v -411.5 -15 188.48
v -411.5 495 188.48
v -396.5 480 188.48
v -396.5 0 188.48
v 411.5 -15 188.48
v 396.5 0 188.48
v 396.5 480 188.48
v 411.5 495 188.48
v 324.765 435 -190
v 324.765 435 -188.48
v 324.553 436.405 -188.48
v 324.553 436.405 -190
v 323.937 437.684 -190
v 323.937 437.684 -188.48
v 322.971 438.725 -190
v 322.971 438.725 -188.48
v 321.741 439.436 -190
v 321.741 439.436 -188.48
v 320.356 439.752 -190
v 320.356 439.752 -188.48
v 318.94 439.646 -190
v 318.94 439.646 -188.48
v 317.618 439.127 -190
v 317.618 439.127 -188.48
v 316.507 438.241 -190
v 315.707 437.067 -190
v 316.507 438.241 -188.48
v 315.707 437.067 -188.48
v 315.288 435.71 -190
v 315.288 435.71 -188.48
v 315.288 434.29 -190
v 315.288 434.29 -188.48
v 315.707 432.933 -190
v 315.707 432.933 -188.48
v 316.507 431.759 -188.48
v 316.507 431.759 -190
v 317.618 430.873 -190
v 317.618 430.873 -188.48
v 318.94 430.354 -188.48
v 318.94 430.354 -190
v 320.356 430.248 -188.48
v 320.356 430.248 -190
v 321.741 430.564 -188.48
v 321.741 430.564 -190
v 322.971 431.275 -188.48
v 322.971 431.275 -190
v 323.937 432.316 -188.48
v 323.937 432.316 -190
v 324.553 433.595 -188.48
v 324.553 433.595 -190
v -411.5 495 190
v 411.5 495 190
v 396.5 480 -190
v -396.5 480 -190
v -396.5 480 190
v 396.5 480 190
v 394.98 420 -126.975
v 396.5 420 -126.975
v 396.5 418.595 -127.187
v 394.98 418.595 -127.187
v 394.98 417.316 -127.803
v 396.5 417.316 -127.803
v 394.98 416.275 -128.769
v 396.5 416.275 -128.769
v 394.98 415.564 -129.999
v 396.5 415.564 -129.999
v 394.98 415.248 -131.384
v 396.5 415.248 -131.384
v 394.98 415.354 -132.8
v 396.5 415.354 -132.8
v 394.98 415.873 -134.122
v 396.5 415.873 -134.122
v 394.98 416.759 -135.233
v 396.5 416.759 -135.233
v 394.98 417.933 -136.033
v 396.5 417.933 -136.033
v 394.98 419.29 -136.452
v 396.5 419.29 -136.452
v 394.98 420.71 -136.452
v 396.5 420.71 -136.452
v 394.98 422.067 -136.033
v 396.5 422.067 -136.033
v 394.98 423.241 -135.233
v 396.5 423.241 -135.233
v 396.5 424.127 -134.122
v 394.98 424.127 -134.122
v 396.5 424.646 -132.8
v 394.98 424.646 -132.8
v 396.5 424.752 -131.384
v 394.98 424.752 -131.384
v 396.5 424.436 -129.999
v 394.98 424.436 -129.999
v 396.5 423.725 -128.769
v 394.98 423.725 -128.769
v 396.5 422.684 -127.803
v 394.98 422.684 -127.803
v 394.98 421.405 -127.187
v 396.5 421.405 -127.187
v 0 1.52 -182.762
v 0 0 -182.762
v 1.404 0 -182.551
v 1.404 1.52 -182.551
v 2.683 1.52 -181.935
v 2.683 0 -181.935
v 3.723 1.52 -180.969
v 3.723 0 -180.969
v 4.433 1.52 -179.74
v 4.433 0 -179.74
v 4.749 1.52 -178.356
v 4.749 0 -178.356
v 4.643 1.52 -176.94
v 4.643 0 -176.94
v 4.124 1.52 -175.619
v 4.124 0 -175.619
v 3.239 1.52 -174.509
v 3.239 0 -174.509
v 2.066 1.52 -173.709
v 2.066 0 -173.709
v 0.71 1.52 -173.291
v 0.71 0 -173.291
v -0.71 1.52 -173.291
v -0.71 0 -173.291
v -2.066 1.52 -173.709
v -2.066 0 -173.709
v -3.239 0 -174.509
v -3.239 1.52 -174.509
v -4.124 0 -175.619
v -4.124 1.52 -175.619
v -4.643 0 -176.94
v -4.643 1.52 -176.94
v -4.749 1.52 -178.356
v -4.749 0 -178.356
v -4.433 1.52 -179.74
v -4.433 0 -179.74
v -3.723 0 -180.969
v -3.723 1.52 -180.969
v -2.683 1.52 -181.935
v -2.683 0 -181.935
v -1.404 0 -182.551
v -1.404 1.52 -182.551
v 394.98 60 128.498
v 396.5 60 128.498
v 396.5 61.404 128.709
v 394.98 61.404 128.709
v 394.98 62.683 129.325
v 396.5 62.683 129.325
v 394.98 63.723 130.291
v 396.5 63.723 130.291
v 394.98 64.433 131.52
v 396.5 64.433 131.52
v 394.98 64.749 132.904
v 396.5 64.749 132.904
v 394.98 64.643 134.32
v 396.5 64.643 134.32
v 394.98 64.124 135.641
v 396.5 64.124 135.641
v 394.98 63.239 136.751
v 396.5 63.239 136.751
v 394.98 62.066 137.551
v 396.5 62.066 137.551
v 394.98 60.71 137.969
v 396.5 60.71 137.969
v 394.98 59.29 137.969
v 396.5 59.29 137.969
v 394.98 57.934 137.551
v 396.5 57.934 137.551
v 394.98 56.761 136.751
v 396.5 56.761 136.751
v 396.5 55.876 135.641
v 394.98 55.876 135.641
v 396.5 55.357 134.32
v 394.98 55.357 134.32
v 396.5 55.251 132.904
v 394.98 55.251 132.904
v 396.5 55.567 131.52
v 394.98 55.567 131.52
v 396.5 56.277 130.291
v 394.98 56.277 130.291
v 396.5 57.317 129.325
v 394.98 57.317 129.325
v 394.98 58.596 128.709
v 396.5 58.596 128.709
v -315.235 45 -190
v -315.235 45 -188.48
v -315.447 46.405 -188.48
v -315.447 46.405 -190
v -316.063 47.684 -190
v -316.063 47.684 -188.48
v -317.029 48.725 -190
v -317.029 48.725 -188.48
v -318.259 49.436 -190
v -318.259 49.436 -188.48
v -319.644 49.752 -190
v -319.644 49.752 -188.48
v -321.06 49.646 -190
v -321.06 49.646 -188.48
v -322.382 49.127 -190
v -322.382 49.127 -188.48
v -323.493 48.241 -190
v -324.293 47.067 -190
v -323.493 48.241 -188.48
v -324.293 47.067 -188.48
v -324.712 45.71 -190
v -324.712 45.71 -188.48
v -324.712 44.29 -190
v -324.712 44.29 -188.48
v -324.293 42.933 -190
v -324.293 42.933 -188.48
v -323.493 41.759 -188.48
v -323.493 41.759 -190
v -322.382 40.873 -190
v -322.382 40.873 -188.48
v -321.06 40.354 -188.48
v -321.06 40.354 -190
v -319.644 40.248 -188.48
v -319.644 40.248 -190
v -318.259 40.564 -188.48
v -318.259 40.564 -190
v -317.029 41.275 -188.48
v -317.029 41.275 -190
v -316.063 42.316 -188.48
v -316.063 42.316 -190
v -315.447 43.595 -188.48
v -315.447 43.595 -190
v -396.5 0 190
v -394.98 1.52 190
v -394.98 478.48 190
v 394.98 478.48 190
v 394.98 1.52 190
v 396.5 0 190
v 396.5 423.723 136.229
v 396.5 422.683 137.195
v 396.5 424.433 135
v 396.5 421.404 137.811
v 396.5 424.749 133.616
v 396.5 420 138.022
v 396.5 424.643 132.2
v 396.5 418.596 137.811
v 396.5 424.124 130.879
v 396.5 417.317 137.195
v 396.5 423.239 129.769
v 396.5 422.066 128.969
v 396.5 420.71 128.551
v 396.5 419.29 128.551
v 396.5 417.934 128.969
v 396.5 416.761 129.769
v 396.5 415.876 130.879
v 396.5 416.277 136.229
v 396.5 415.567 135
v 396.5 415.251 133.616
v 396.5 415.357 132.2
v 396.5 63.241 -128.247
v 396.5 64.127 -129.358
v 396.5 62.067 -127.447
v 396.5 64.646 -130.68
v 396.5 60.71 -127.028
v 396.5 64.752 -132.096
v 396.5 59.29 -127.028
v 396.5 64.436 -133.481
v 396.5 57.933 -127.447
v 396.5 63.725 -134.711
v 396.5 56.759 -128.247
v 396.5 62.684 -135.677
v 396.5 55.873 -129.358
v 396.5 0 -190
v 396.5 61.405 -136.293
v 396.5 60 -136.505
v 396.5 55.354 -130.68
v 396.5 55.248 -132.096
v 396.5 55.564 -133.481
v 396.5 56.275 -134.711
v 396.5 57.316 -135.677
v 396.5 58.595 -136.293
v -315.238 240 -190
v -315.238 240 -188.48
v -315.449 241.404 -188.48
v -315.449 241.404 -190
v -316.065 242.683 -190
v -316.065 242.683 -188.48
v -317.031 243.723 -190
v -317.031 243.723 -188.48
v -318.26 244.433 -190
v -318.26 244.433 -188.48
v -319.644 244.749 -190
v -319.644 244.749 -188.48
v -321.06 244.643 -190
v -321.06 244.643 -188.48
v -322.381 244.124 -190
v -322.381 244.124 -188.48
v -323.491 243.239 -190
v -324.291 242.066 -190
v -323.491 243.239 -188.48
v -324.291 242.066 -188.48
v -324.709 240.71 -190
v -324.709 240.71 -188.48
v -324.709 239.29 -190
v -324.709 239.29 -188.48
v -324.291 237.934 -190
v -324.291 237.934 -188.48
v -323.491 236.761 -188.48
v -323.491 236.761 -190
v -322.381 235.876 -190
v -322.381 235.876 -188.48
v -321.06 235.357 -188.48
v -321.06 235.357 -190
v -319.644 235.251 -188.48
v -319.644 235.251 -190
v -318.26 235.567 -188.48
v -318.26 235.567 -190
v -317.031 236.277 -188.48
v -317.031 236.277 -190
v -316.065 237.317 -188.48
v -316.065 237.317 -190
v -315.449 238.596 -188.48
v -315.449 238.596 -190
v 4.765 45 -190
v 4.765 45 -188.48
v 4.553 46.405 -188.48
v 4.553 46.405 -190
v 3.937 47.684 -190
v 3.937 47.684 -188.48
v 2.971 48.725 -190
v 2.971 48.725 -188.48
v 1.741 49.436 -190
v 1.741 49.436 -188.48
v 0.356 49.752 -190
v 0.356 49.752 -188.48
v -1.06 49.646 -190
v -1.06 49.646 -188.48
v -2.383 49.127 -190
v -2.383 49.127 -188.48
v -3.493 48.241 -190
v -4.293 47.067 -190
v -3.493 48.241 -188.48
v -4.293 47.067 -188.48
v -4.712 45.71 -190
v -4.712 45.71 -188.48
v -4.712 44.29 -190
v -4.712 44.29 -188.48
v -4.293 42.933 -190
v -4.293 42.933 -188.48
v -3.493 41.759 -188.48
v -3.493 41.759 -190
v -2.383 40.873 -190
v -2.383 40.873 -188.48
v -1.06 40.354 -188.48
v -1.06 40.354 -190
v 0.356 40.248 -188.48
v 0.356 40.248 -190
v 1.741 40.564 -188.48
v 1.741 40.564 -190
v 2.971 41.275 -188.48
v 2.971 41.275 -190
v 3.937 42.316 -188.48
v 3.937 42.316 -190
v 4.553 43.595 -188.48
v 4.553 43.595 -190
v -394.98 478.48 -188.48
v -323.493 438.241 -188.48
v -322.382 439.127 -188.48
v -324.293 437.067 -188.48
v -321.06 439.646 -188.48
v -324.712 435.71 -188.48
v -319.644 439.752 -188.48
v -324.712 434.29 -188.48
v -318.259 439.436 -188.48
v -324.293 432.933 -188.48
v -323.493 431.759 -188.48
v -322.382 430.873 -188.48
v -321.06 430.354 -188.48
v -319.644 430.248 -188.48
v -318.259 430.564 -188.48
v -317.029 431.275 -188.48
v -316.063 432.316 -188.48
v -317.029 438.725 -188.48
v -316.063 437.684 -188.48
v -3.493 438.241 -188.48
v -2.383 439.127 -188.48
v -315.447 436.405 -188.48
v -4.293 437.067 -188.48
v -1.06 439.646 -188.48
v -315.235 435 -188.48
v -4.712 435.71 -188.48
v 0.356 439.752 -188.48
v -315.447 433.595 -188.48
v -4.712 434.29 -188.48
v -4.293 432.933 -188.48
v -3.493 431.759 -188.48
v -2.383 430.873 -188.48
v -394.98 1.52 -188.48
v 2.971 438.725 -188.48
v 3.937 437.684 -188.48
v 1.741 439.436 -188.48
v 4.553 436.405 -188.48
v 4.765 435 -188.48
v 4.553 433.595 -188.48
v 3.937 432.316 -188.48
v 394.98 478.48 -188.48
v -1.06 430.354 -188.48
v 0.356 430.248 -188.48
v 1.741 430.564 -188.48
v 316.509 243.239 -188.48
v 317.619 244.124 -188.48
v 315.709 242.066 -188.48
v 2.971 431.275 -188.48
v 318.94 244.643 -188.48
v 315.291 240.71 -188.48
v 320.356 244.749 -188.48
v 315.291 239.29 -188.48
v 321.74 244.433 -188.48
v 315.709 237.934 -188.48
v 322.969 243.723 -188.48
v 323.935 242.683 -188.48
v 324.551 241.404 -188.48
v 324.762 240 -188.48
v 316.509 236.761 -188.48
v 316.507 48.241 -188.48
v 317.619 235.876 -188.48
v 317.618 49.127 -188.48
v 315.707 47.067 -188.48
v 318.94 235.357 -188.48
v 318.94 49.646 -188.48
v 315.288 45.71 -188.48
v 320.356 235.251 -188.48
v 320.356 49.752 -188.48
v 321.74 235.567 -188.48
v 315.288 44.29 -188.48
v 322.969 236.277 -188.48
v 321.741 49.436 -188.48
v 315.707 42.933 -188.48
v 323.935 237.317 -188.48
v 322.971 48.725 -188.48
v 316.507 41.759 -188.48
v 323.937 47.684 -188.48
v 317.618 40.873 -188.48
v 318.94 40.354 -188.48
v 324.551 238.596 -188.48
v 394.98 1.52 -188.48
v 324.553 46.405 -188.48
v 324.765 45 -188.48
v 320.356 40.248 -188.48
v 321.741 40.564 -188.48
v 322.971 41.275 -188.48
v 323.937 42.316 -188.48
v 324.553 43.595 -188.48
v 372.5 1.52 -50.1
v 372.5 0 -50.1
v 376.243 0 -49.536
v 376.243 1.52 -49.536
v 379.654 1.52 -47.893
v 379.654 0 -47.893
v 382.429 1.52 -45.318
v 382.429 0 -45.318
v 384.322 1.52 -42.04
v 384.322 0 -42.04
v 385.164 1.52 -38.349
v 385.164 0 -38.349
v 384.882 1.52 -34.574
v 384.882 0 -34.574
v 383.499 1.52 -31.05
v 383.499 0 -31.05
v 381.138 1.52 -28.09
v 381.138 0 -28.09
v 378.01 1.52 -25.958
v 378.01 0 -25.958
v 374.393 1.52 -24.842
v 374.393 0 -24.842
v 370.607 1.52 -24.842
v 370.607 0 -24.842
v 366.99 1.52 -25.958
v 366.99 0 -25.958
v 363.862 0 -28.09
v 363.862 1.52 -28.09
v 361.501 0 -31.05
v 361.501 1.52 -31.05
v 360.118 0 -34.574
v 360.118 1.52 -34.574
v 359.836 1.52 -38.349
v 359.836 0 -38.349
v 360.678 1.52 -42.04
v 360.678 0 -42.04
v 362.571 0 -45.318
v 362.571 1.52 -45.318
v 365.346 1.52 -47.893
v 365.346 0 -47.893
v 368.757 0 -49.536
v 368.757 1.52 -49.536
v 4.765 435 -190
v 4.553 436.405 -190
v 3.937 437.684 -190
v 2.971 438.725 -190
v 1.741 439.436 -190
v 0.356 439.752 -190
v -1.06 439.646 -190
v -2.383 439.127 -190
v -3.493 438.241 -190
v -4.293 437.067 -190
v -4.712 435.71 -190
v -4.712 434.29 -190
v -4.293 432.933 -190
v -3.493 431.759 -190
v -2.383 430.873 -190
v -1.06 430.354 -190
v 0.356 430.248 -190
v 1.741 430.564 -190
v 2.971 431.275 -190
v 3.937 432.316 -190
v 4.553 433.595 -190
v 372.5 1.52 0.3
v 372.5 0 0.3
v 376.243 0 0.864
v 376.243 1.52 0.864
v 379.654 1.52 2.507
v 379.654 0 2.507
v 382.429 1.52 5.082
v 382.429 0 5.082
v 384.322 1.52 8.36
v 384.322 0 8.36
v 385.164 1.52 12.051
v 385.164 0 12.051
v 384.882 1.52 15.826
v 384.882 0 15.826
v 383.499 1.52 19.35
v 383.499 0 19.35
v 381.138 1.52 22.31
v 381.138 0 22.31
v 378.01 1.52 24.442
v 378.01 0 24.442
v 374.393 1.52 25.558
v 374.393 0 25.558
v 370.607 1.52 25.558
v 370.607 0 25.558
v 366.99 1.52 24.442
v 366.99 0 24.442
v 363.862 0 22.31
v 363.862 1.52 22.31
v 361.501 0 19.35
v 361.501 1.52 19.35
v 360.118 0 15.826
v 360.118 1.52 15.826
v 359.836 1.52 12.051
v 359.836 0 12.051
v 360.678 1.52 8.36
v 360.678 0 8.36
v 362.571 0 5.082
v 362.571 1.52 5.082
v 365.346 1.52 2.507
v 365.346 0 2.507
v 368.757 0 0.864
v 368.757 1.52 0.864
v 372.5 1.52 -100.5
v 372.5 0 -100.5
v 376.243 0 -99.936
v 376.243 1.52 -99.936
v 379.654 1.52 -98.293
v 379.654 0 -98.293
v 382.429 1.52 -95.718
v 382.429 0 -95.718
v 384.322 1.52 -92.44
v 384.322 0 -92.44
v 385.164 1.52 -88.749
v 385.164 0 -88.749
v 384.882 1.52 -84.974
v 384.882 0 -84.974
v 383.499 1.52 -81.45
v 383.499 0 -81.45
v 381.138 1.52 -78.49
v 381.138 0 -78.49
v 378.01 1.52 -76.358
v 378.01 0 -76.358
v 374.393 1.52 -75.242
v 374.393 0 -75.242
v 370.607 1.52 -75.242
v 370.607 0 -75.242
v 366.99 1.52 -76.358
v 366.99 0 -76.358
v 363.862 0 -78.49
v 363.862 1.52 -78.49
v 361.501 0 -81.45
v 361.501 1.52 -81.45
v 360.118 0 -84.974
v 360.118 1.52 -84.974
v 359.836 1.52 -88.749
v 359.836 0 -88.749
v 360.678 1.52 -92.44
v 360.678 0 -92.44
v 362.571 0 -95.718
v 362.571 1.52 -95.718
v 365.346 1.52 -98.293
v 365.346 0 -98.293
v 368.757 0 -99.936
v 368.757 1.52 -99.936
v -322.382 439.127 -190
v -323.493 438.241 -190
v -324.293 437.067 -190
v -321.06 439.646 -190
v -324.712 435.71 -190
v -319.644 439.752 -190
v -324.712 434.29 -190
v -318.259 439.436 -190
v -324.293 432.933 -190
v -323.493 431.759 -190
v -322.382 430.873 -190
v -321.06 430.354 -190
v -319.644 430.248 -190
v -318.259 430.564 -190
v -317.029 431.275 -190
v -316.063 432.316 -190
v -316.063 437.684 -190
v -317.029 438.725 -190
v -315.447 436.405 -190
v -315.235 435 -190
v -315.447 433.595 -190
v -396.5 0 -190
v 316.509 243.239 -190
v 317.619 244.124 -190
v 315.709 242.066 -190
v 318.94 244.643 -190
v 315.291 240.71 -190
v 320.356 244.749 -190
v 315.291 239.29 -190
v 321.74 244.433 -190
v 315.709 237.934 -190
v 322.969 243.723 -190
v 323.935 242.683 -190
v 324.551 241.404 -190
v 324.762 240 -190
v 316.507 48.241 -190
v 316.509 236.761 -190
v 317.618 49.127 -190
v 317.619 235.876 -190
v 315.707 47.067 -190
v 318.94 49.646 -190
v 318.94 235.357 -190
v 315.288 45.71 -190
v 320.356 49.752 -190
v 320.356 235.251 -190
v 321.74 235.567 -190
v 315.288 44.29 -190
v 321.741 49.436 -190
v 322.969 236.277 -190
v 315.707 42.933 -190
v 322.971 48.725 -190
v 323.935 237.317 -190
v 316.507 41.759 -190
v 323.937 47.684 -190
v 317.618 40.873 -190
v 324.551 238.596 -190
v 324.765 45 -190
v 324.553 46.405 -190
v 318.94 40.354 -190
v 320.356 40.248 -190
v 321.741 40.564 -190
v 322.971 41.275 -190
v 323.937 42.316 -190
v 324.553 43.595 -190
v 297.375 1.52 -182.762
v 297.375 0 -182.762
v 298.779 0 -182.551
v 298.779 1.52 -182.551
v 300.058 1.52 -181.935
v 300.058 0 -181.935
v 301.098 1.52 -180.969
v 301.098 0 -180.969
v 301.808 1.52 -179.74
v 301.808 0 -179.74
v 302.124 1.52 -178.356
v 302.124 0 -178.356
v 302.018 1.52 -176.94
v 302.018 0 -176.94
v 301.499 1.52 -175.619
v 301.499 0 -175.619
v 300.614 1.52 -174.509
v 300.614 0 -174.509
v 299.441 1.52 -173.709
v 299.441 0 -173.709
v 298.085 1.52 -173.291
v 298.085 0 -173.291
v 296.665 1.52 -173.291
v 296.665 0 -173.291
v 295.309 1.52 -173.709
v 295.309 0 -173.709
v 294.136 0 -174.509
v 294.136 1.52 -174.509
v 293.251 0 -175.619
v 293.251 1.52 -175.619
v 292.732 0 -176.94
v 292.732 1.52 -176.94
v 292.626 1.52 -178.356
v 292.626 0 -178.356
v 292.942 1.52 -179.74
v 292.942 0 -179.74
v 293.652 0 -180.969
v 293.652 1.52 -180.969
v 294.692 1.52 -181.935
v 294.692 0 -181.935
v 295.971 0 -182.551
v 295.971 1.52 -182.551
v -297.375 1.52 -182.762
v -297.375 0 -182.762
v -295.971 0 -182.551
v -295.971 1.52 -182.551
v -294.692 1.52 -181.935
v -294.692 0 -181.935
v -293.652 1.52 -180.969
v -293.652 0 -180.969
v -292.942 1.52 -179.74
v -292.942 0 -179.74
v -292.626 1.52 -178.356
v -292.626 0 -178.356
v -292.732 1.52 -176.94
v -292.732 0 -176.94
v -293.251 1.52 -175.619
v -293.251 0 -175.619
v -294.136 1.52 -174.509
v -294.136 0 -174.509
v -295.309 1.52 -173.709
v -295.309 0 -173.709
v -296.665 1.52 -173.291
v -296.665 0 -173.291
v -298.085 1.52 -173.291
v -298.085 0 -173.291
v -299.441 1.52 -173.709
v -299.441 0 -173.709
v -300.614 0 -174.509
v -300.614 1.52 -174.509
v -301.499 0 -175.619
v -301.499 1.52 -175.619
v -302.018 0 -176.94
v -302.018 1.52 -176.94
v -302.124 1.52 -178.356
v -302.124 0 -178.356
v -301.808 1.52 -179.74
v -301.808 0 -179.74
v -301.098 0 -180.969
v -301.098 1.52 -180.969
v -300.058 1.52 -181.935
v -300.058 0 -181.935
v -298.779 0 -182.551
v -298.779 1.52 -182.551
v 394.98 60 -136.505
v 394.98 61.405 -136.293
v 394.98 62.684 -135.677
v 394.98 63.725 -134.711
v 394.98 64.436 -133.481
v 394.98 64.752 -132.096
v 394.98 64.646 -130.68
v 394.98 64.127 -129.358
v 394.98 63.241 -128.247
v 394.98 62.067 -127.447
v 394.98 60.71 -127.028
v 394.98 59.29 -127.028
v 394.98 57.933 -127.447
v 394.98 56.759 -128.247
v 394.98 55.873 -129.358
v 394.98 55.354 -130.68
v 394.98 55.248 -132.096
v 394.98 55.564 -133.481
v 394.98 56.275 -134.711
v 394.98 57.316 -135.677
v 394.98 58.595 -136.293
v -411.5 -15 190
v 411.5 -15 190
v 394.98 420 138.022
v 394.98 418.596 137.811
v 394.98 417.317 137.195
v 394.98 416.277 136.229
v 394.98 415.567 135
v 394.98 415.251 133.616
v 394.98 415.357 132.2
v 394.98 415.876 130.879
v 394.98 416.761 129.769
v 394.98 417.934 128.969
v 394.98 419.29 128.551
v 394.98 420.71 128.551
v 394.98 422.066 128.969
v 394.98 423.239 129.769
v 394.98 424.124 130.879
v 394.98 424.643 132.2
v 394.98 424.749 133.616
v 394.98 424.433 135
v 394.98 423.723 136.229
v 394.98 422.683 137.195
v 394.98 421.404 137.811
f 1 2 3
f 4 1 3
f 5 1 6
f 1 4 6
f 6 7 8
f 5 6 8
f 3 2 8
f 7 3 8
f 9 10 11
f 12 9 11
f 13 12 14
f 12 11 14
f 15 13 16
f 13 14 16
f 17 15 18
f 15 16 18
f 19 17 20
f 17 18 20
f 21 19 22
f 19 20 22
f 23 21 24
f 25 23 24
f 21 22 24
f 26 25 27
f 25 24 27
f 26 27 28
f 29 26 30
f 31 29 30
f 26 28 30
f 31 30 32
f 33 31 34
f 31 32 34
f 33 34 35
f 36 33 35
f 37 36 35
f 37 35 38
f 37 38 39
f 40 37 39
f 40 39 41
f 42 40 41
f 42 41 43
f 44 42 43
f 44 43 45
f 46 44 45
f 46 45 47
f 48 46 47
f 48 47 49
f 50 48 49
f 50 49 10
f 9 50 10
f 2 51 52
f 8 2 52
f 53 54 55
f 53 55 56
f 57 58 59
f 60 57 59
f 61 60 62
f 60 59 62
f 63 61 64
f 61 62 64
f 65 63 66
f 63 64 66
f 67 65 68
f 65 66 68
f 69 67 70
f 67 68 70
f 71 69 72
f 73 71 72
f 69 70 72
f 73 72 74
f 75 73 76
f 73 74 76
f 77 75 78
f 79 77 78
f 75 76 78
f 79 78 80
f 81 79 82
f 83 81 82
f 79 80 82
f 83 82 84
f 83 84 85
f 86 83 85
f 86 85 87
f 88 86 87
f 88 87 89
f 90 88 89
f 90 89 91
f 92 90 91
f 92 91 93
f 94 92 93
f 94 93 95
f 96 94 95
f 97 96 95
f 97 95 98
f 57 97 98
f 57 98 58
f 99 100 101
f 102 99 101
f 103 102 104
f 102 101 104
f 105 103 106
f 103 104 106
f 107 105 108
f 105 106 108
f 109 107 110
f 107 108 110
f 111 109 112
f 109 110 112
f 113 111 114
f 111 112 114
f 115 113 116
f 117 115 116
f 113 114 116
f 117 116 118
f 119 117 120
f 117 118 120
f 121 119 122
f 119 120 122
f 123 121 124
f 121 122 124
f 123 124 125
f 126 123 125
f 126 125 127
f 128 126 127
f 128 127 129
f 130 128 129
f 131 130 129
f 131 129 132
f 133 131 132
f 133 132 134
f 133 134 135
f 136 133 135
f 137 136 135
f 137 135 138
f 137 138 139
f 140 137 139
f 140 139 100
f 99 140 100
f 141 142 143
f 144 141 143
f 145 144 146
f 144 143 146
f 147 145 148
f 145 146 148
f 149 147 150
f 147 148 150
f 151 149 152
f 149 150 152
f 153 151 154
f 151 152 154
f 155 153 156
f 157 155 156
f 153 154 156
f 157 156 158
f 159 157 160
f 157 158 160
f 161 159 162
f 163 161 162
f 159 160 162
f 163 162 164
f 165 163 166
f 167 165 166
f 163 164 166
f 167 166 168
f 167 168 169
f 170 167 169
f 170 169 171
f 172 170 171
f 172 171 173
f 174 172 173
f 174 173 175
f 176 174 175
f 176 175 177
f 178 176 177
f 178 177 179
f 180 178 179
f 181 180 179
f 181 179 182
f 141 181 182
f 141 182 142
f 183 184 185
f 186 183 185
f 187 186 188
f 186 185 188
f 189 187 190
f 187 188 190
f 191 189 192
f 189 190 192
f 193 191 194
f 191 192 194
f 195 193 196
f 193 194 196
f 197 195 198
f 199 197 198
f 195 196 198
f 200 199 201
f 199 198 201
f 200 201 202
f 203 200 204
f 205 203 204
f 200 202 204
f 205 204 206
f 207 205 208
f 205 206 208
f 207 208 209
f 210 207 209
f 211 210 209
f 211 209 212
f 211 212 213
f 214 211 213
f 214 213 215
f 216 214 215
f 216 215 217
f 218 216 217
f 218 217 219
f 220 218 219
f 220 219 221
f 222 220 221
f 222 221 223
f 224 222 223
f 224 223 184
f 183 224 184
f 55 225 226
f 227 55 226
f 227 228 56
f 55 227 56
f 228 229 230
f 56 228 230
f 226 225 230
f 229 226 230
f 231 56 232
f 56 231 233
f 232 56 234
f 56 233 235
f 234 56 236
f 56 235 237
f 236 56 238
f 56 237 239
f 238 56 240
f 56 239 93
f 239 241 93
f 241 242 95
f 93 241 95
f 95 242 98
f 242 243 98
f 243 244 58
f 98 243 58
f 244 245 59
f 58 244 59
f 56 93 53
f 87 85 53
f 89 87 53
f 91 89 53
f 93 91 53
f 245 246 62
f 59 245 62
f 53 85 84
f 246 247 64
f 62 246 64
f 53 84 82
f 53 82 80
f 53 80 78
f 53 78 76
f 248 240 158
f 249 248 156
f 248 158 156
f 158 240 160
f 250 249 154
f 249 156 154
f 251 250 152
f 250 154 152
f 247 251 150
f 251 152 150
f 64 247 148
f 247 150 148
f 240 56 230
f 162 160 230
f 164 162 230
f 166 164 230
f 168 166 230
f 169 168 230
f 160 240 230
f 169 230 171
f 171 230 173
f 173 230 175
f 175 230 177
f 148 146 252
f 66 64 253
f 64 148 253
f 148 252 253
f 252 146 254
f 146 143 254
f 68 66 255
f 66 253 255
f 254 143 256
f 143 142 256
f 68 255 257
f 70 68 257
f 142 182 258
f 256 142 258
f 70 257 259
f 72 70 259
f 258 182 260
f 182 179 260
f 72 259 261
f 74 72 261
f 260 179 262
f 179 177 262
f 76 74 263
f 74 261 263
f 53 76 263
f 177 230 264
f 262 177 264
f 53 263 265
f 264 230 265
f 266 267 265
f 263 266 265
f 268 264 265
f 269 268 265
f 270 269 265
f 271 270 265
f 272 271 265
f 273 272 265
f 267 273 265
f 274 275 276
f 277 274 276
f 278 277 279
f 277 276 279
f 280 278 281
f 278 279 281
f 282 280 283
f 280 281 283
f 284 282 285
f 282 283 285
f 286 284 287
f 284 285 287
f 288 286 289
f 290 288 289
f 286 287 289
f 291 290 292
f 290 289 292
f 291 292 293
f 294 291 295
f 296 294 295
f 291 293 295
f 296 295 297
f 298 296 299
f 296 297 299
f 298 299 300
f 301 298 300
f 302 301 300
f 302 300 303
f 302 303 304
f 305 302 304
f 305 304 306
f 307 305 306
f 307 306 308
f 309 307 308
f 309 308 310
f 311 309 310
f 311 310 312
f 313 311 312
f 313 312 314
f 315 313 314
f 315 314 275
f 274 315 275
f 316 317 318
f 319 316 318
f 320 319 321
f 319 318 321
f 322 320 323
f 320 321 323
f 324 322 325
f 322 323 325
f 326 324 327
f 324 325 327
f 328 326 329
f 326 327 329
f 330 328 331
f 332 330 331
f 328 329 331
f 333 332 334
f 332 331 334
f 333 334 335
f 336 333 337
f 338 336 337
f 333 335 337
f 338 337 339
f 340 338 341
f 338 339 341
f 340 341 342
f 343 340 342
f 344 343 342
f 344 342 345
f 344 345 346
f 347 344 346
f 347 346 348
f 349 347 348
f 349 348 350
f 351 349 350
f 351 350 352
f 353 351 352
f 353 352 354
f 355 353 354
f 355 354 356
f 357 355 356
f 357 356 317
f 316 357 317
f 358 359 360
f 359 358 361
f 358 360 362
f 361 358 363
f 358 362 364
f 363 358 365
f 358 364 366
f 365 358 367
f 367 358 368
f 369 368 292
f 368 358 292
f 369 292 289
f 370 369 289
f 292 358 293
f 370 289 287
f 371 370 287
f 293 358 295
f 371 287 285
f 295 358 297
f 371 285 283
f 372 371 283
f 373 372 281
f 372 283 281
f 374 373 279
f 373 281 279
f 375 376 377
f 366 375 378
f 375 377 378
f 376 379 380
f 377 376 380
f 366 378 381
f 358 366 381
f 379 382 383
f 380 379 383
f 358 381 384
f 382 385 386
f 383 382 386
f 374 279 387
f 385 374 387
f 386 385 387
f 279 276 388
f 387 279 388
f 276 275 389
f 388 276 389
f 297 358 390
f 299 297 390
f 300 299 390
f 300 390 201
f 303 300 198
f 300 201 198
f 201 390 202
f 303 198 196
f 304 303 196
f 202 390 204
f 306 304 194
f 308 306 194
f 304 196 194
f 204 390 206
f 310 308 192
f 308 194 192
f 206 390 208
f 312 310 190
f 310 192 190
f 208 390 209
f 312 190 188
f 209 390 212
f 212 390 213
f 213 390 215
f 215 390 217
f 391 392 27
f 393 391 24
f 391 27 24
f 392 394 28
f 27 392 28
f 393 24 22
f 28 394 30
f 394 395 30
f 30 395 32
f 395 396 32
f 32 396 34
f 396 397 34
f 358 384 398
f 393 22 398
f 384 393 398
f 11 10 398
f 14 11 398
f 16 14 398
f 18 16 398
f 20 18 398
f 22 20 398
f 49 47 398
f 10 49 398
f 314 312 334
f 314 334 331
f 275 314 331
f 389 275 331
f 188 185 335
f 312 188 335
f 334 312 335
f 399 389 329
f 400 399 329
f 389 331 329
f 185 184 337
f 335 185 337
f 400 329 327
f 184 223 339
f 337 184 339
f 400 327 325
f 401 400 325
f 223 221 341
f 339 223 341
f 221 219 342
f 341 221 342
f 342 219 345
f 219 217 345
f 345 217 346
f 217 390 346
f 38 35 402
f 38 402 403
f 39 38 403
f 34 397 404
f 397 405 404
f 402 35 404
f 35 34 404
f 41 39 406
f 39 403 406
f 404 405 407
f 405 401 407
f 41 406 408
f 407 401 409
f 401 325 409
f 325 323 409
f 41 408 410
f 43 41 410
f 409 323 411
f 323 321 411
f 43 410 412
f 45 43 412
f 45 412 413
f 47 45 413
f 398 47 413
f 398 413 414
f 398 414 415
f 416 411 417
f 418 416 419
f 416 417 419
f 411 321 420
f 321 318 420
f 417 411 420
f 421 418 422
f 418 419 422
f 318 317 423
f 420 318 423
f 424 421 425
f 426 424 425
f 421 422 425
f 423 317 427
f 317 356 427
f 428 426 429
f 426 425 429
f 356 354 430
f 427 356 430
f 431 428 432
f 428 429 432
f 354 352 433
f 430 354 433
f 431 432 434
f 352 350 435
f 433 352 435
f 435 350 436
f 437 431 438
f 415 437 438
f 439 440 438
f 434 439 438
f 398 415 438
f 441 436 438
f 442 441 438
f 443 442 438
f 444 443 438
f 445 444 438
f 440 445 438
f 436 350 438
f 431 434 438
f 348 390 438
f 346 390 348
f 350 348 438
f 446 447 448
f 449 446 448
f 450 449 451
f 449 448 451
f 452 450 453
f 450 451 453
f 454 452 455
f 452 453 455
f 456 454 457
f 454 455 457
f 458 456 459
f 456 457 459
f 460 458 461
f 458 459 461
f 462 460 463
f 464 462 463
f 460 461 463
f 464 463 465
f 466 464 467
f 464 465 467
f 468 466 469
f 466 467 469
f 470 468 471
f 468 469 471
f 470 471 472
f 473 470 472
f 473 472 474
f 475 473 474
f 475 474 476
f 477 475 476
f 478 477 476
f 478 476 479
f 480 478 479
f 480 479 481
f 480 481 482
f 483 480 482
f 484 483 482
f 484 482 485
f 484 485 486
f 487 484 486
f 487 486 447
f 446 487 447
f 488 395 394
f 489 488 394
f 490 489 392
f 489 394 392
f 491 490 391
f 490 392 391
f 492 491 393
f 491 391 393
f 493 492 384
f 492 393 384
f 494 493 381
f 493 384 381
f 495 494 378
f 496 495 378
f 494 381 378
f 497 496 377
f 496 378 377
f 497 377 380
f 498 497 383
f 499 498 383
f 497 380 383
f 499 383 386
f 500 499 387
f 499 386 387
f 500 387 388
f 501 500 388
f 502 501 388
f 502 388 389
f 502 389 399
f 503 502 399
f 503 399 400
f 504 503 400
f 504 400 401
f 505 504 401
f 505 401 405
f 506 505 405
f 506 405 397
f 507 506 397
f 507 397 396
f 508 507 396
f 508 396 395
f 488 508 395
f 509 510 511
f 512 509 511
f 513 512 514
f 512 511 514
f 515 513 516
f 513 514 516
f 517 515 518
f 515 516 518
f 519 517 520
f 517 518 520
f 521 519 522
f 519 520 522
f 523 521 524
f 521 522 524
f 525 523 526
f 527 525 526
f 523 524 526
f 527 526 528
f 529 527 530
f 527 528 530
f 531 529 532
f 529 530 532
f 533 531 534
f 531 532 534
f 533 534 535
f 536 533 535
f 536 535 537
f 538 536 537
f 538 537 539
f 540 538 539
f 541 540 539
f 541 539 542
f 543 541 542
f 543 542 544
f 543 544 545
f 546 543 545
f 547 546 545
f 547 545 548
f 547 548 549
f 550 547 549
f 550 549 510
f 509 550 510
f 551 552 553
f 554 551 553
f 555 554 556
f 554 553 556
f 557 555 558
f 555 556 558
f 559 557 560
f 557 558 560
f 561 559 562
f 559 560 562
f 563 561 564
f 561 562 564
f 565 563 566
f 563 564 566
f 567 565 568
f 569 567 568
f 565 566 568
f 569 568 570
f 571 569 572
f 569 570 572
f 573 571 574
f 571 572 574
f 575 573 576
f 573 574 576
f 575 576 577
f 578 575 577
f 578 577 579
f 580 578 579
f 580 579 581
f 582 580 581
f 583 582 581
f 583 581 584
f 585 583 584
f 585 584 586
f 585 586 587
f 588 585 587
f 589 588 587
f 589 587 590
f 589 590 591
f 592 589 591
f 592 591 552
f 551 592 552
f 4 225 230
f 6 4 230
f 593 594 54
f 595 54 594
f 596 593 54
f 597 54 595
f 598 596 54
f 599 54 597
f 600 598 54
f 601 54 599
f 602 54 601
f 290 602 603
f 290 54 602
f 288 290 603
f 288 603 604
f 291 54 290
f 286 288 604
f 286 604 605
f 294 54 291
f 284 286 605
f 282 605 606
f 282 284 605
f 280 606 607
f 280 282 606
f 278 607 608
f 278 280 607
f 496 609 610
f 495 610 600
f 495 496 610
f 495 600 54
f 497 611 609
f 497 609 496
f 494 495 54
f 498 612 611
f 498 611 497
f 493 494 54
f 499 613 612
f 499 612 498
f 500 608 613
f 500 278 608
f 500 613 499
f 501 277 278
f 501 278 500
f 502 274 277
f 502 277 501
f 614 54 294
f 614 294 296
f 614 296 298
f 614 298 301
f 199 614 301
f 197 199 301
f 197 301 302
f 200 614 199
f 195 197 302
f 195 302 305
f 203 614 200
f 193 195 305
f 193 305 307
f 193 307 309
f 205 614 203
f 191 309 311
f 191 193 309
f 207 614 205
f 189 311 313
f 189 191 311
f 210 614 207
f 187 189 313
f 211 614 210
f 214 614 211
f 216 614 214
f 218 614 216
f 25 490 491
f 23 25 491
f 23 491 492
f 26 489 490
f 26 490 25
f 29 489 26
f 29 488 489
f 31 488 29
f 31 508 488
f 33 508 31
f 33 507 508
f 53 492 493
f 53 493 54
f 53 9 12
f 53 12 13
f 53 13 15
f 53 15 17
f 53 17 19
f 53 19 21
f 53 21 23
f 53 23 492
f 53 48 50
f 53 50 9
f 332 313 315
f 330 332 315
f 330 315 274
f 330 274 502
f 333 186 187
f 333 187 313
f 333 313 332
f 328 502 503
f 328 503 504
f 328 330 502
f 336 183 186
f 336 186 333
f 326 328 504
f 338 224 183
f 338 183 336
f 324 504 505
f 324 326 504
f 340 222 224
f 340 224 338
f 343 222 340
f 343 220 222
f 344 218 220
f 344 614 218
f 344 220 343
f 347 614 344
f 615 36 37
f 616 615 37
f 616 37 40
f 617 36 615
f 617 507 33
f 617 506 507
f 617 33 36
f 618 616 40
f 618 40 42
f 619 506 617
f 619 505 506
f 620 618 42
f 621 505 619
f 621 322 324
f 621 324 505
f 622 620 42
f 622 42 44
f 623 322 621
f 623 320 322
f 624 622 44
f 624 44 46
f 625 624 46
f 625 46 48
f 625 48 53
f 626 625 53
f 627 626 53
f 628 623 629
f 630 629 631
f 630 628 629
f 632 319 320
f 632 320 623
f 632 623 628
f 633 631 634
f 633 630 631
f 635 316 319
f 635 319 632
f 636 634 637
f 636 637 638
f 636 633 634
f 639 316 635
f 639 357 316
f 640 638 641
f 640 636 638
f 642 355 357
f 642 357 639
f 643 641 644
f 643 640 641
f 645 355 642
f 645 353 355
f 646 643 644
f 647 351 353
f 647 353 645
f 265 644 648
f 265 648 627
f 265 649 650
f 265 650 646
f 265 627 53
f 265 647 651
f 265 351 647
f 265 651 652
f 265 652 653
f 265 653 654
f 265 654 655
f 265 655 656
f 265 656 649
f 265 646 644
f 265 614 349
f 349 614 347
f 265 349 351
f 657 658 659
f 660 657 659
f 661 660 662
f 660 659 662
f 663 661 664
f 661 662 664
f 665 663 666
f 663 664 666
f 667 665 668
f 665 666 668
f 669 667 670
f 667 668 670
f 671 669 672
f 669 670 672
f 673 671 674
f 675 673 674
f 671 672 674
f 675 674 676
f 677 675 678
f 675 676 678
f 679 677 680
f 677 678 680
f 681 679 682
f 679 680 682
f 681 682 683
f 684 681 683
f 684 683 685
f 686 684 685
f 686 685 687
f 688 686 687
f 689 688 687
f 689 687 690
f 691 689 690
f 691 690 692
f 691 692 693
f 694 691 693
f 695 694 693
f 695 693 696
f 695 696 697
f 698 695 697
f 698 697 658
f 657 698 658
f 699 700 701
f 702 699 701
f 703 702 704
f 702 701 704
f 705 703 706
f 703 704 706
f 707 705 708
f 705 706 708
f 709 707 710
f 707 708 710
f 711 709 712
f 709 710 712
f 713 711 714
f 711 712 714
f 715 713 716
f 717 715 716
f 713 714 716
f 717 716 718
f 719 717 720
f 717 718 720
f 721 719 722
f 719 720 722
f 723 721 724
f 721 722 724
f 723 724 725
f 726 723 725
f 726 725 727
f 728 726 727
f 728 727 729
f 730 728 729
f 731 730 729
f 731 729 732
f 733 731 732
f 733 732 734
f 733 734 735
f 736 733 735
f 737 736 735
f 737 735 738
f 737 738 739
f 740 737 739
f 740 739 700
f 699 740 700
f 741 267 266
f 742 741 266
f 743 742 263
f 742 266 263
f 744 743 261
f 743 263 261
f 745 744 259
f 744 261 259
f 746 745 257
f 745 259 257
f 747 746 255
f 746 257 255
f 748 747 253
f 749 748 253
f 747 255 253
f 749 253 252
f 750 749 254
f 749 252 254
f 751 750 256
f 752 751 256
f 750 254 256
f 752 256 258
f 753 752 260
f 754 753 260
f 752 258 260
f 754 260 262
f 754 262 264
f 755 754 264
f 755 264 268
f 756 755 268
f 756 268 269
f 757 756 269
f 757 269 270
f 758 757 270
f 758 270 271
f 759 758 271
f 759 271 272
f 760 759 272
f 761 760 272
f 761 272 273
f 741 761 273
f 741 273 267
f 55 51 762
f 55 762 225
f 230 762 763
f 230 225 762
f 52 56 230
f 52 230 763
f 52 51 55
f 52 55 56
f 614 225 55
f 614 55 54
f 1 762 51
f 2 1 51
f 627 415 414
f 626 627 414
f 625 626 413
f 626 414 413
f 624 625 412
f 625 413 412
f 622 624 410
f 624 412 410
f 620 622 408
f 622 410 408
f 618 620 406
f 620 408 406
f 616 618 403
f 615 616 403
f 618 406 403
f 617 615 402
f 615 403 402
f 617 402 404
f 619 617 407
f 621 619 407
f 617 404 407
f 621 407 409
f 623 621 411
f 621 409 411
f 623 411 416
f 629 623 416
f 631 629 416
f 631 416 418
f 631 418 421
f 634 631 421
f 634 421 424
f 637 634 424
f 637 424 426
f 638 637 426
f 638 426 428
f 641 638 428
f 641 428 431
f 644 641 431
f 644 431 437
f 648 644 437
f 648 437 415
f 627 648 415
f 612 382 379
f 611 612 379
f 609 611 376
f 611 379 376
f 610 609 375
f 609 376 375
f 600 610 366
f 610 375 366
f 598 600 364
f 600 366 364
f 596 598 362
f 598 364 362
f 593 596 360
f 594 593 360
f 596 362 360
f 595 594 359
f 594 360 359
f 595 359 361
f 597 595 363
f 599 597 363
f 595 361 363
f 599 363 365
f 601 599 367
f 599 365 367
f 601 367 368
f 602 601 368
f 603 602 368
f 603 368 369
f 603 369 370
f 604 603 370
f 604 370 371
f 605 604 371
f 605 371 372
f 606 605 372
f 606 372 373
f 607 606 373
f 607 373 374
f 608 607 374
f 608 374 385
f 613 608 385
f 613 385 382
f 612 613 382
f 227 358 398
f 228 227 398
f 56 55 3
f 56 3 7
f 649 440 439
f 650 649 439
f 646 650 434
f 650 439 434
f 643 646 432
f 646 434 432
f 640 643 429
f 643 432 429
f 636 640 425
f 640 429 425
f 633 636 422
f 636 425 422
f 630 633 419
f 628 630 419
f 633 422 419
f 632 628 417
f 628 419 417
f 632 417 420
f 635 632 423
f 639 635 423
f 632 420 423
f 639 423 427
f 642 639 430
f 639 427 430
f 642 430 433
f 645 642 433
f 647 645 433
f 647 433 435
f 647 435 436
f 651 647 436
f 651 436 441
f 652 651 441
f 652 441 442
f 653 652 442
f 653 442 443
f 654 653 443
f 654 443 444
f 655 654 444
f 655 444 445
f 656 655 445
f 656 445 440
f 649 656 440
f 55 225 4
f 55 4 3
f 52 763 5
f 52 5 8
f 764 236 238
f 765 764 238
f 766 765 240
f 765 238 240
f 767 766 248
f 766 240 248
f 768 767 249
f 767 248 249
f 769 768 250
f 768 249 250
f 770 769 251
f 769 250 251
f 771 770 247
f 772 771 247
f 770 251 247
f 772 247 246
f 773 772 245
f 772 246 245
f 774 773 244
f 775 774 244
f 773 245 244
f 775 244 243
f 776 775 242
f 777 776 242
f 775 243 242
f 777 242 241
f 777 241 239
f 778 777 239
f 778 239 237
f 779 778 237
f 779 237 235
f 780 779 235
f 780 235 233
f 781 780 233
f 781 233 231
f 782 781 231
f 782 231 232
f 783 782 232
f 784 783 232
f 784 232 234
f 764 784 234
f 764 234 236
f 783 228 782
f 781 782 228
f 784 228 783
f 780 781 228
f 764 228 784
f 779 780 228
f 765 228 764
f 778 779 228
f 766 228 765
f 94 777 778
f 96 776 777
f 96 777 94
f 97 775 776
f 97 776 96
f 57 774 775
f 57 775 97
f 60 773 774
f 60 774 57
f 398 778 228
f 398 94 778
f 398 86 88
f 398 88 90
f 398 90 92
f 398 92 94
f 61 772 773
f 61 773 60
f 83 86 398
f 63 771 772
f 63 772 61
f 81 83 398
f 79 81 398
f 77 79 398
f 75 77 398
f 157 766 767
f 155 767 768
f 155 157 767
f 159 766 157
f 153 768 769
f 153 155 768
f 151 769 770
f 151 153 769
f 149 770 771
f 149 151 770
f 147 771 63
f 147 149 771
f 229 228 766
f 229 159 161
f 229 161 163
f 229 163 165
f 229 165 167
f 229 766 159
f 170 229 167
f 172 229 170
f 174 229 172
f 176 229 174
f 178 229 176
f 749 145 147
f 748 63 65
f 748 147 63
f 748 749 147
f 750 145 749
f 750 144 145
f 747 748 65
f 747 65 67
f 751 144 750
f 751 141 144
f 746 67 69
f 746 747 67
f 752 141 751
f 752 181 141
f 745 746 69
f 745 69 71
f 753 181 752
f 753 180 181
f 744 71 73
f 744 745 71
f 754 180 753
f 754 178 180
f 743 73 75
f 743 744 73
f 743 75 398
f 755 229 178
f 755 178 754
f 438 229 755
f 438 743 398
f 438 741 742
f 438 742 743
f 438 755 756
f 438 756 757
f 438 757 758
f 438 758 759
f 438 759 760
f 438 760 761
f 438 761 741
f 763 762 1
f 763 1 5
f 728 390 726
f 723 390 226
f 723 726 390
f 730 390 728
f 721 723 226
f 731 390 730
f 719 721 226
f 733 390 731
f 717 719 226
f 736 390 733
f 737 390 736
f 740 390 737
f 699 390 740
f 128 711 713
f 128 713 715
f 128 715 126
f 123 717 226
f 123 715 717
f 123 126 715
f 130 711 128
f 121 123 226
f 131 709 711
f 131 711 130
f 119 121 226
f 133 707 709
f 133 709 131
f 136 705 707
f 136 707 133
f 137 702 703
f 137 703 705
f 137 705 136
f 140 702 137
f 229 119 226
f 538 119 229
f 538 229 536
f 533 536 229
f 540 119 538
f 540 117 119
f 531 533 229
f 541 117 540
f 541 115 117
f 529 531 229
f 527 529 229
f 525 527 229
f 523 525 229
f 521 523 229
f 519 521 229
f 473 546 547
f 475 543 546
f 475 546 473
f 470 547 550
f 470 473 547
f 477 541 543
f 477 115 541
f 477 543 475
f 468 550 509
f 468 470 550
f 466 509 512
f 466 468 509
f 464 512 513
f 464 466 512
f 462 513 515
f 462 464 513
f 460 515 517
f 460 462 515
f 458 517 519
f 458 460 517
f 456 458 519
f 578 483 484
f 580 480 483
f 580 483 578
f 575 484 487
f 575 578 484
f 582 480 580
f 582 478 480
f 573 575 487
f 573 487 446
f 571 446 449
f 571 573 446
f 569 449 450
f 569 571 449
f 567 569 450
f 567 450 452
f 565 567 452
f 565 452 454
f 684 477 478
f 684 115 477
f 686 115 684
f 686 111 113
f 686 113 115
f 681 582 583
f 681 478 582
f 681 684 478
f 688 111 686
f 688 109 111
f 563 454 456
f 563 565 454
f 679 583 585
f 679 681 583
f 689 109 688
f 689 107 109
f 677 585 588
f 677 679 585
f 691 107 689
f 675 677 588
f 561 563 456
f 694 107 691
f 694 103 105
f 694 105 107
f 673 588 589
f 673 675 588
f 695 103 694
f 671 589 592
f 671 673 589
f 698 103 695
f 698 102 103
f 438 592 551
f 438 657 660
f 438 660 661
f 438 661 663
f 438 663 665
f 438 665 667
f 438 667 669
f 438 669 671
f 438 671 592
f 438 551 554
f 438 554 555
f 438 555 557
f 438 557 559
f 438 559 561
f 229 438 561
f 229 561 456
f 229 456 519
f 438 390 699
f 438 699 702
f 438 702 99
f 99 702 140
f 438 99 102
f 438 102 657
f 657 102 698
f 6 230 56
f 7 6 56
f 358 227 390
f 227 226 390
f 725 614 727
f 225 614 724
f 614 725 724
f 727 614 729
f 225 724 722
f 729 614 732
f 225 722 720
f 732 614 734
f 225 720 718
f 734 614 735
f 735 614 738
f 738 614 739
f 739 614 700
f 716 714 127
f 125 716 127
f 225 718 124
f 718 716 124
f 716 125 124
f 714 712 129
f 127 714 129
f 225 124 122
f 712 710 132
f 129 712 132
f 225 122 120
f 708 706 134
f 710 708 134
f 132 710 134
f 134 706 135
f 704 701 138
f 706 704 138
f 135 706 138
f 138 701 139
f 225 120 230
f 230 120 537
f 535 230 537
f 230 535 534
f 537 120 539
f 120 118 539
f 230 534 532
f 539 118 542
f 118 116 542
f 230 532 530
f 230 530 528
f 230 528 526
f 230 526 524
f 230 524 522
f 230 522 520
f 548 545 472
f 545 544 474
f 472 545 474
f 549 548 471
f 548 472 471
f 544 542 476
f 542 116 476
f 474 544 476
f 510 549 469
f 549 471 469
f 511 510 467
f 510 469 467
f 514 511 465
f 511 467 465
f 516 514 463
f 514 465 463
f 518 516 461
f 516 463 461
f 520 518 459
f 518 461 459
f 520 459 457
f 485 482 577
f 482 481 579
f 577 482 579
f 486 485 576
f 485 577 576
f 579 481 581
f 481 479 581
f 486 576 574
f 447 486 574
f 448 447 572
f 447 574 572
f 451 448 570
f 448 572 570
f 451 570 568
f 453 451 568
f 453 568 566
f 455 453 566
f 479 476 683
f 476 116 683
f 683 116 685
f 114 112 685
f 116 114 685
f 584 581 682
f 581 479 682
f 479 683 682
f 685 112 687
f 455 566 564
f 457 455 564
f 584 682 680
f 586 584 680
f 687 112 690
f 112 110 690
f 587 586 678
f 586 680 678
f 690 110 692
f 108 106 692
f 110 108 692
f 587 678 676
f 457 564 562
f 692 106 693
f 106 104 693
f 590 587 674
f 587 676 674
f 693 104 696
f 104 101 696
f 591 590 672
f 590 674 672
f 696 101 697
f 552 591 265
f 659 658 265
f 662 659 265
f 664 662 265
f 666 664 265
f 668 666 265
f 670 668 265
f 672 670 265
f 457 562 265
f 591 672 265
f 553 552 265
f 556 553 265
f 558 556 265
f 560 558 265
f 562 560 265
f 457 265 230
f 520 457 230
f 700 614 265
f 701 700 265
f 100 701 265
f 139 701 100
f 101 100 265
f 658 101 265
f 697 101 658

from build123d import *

# Parameters (mm, degrees)
CROQUIS1_W              = 793
CROQUIS1_H              = 380
SALIENTE_EXTRUIR1_DEPTH = 480
VACIADO1_T              = -1.52
CROQUIS2_W              = 823
CROQUIS2_H              = 510
CROQUIS2_W_2            = 793
CROQUIS2_H_2            = 480
SALIENTE_EXTRUIR2_DEPTH = 1.52
CROQUIS3_R              = 4.765
CROQUIS3_R_2            = 4.7625
CORTAR_EXTRUIR1_DEPTH   = 10
CROQUIS4_R              = 4.765
CROQUIS4_R_2            = 4.7625
CORTAR_EXTRUIR2_DEPTH   = 10
CROQUIS5_R              = 4.7625
CORTAR_EXTRUIR3_DEPTH   = 10
CROQUIS6_R              = 12.7
CORTAR_EXTRUIR4_DEPTH   = 10


with BuildPart() as part:
    # Croquis1 → Saliente-Extruir1 (new body)
    with BuildSketch(Plane(origin=(0, 0, 0), x_dir=(1, 0, 0), z_dir=(0, 1, 0))):
        Rectangle(CROQUIS1_W, CROQUIS1_H)
    extrude(amount=SALIENTE_EXTRUIR1_DEPTH)

    # Vaciado1
    vaciado1_openings = [part.faces().sort_by_distance(p)[0] for p in [
        (0, 240, 190),
    ]]
    offset(amount=VACIADO1_T, openings=vaciado1_openings, kind=Kind.INTERSECTION)

    # Croquis3 → Cortar-Extruir1 (cut)
    with BuildSketch(Plane(origin=(396.5, 0, 0), x_dir=(0, 0, -1), z_dir=(1, 0, 0))):
        with Locations((131.74, 60)):
            Circle(CROQUIS3_R)
        with Locations((-133.26, 60)):
            Circle(CROQUIS3_R_2)
        with Locations(Location((131.74, 420, 0), (0, 0, 180))):
            Circle(CROQUIS3_R)
        with Locations(Location((-133.26, 420, 0), (0, 0, 180))):
            Circle(CROQUIS3_R_2)
    extrude(amount=-CORTAR_EXTRUIR1_DEPTH, mode=Mode.SUBTRACT)

    # Croquis4 → Cortar-Extruir2 (cut)
    with BuildSketch(Plane.XY.offset(-188.48)):
        with Locations((-320, 435)):
            Circle(CROQUIS4_R)
        with Locations((-320, 240)):
            Circle(CROQUIS4_R_2)
        with Locations((-320, 45)):
            Circle(CROQUIS4_R)
        with Locations((320, 45)):
            Circle(CROQUIS4_R)
        with Locations((320, 435)):
            Circle(CROQUIS4_R)
        with Locations((320, 240)):
            Circle(CROQUIS4_R_2)
        with Locations((0, 45)):
            Circle(CROQUIS4_R)
        with Locations((0, 435)):
            Circle(CROQUIS4_R)
    extrude(amount=-CORTAR_EXTRUIR2_DEPTH, mode=Mode.SUBTRACT)

    # Croquis5 → Cortar-Extruir3 (cut)
    with BuildSketch(Plane.XZ):
        with Locations(Location((-297.375, -178, 0), (0, 0, 270))):
            Circle(CROQUIS5_R)
        with Locations(Location((0, -178, 0), (0, 0, 270))):
            Circle(CROQUIS5_R)
        with Locations(Location((297.375, -178, 0), (0, 0, 270))):
            Circle(CROQUIS5_R)
    extrude(amount=-CORTAR_EXTRUIR3_DEPTH, mode=Mode.SUBTRACT)

    # Croquis6 → Cortar-Extruir4 (cut)
    with BuildSketch(Plane.XZ):
        with Locations(Location((372.5, -87.8, 0), (0, 0, 270))):
            Circle(CROQUIS6_R)
        with Locations(Location((372.5, -37.4, 0), (0, 0, 270))):
            Circle(CROQUIS6_R)
        with Locations(Location((372.5, 13, 0), (0, 0, 270))):
            Circle(CROQUIS6_R)
    extrude(amount=-CORTAR_EXTRUIR4_DEPTH, mode=Mode.SUBTRACT)


with BuildPart() as body_2:
    # Croquis2 → Saliente-Extruir2 (new body)
    with BuildSketch(Plane.XY.offset(190)):
        with Locations((0, 240)):
            Rectangle(CROQUIS2_W, CROQUIS2_H)
        with Locations((0, 240)):
            Rectangle(CROQUIS2_W_2, CROQUIS2_H_2, mode=Mode.SUBTRACT)
    extrude(amount=-SALIENTE_EXTRUIR2_DEPTH)


solid = Compound([part.part, body_2.part])
